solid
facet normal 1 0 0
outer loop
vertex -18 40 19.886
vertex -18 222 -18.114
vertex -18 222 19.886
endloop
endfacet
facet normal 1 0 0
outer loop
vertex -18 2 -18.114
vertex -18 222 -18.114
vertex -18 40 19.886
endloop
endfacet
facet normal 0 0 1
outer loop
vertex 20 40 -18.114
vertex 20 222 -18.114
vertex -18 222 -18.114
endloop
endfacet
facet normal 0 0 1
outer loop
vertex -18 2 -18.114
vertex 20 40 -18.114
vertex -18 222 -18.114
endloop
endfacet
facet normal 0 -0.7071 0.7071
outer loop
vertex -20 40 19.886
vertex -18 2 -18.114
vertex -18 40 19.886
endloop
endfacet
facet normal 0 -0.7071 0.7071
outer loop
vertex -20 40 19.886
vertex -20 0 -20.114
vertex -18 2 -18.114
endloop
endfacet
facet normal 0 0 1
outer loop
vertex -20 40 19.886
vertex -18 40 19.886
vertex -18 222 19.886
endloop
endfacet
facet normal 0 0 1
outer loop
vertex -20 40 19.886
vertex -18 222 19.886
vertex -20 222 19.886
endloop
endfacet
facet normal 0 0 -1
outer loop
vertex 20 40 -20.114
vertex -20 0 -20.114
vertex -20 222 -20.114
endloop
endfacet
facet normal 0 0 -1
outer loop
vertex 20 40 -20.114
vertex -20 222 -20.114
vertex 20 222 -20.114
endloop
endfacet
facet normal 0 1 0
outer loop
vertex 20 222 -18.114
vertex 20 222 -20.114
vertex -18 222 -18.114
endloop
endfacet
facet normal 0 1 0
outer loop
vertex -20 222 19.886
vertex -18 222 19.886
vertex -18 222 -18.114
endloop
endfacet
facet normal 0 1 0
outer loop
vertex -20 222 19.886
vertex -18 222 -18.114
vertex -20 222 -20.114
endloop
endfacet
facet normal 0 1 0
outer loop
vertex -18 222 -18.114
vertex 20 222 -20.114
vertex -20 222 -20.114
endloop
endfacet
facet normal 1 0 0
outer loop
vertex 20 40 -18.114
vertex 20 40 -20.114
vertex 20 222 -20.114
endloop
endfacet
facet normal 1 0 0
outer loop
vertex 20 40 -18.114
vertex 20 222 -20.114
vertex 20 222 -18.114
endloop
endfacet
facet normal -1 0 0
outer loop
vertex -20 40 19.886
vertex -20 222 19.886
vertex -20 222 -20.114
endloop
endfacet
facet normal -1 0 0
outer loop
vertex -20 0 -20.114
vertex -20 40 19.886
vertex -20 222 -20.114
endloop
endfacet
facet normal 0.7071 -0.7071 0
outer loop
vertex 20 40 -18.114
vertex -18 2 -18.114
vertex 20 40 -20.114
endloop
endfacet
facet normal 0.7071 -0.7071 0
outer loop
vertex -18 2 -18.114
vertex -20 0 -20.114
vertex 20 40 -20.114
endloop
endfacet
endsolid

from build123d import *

# Parameters (mm, degrees)
BOSS_EXTRU_1_DEPTH      = 222
ENL_V_MAT_EXTRU_1_DEPTH = 590
ENL_V_MAT_EXTRU_2_DEPTH = 590


with BuildPart() as part:
    # Esquisse1 → Boss.-Extru.1 (new body)
    with BuildSketch(Plane(origin=(0, 0, 0), x_dir=(1, 0, 0), z_dir=(0, 1, 0))):
        Polygon((-20, 20.113636364), (20, 20.113636364), (20, 18.113636364), (-18, 18.113636364), (-18, -19.886363636), (-20, -19.886363636), align=None)
    extrude(amount=BOSS_EXTRU_1_DEPTH)

    # Esquisse2 → Enlèv. mat.-Extru.1 (cut)
    with BuildSketch(Plane(origin=(0, 0, -20.113636364), x_dir=(-1, 0, 0), z_dir=(0, 0, -1))):
        Polygon((20, 0), (-20, 40), (-20, 0), align=None)
    extrude(amount=-ENL_V_MAT_EXTRU_1_DEPTH, mode=Mode.SUBTRACT)

    # Esquisse3 → Enlèv. mat.-Extru.2 (cut)
    with BuildSketch(Plane.ZY.offset(20)):
        Polygon((-20.113636364, 0), (19.886363636, 40), (19.886363636, 0), align=None)
    extrude(amount=-ENL_V_MAT_EXTRU_2_DEPTH, mode=Mode.SUBTRACT)


solid = part.part
